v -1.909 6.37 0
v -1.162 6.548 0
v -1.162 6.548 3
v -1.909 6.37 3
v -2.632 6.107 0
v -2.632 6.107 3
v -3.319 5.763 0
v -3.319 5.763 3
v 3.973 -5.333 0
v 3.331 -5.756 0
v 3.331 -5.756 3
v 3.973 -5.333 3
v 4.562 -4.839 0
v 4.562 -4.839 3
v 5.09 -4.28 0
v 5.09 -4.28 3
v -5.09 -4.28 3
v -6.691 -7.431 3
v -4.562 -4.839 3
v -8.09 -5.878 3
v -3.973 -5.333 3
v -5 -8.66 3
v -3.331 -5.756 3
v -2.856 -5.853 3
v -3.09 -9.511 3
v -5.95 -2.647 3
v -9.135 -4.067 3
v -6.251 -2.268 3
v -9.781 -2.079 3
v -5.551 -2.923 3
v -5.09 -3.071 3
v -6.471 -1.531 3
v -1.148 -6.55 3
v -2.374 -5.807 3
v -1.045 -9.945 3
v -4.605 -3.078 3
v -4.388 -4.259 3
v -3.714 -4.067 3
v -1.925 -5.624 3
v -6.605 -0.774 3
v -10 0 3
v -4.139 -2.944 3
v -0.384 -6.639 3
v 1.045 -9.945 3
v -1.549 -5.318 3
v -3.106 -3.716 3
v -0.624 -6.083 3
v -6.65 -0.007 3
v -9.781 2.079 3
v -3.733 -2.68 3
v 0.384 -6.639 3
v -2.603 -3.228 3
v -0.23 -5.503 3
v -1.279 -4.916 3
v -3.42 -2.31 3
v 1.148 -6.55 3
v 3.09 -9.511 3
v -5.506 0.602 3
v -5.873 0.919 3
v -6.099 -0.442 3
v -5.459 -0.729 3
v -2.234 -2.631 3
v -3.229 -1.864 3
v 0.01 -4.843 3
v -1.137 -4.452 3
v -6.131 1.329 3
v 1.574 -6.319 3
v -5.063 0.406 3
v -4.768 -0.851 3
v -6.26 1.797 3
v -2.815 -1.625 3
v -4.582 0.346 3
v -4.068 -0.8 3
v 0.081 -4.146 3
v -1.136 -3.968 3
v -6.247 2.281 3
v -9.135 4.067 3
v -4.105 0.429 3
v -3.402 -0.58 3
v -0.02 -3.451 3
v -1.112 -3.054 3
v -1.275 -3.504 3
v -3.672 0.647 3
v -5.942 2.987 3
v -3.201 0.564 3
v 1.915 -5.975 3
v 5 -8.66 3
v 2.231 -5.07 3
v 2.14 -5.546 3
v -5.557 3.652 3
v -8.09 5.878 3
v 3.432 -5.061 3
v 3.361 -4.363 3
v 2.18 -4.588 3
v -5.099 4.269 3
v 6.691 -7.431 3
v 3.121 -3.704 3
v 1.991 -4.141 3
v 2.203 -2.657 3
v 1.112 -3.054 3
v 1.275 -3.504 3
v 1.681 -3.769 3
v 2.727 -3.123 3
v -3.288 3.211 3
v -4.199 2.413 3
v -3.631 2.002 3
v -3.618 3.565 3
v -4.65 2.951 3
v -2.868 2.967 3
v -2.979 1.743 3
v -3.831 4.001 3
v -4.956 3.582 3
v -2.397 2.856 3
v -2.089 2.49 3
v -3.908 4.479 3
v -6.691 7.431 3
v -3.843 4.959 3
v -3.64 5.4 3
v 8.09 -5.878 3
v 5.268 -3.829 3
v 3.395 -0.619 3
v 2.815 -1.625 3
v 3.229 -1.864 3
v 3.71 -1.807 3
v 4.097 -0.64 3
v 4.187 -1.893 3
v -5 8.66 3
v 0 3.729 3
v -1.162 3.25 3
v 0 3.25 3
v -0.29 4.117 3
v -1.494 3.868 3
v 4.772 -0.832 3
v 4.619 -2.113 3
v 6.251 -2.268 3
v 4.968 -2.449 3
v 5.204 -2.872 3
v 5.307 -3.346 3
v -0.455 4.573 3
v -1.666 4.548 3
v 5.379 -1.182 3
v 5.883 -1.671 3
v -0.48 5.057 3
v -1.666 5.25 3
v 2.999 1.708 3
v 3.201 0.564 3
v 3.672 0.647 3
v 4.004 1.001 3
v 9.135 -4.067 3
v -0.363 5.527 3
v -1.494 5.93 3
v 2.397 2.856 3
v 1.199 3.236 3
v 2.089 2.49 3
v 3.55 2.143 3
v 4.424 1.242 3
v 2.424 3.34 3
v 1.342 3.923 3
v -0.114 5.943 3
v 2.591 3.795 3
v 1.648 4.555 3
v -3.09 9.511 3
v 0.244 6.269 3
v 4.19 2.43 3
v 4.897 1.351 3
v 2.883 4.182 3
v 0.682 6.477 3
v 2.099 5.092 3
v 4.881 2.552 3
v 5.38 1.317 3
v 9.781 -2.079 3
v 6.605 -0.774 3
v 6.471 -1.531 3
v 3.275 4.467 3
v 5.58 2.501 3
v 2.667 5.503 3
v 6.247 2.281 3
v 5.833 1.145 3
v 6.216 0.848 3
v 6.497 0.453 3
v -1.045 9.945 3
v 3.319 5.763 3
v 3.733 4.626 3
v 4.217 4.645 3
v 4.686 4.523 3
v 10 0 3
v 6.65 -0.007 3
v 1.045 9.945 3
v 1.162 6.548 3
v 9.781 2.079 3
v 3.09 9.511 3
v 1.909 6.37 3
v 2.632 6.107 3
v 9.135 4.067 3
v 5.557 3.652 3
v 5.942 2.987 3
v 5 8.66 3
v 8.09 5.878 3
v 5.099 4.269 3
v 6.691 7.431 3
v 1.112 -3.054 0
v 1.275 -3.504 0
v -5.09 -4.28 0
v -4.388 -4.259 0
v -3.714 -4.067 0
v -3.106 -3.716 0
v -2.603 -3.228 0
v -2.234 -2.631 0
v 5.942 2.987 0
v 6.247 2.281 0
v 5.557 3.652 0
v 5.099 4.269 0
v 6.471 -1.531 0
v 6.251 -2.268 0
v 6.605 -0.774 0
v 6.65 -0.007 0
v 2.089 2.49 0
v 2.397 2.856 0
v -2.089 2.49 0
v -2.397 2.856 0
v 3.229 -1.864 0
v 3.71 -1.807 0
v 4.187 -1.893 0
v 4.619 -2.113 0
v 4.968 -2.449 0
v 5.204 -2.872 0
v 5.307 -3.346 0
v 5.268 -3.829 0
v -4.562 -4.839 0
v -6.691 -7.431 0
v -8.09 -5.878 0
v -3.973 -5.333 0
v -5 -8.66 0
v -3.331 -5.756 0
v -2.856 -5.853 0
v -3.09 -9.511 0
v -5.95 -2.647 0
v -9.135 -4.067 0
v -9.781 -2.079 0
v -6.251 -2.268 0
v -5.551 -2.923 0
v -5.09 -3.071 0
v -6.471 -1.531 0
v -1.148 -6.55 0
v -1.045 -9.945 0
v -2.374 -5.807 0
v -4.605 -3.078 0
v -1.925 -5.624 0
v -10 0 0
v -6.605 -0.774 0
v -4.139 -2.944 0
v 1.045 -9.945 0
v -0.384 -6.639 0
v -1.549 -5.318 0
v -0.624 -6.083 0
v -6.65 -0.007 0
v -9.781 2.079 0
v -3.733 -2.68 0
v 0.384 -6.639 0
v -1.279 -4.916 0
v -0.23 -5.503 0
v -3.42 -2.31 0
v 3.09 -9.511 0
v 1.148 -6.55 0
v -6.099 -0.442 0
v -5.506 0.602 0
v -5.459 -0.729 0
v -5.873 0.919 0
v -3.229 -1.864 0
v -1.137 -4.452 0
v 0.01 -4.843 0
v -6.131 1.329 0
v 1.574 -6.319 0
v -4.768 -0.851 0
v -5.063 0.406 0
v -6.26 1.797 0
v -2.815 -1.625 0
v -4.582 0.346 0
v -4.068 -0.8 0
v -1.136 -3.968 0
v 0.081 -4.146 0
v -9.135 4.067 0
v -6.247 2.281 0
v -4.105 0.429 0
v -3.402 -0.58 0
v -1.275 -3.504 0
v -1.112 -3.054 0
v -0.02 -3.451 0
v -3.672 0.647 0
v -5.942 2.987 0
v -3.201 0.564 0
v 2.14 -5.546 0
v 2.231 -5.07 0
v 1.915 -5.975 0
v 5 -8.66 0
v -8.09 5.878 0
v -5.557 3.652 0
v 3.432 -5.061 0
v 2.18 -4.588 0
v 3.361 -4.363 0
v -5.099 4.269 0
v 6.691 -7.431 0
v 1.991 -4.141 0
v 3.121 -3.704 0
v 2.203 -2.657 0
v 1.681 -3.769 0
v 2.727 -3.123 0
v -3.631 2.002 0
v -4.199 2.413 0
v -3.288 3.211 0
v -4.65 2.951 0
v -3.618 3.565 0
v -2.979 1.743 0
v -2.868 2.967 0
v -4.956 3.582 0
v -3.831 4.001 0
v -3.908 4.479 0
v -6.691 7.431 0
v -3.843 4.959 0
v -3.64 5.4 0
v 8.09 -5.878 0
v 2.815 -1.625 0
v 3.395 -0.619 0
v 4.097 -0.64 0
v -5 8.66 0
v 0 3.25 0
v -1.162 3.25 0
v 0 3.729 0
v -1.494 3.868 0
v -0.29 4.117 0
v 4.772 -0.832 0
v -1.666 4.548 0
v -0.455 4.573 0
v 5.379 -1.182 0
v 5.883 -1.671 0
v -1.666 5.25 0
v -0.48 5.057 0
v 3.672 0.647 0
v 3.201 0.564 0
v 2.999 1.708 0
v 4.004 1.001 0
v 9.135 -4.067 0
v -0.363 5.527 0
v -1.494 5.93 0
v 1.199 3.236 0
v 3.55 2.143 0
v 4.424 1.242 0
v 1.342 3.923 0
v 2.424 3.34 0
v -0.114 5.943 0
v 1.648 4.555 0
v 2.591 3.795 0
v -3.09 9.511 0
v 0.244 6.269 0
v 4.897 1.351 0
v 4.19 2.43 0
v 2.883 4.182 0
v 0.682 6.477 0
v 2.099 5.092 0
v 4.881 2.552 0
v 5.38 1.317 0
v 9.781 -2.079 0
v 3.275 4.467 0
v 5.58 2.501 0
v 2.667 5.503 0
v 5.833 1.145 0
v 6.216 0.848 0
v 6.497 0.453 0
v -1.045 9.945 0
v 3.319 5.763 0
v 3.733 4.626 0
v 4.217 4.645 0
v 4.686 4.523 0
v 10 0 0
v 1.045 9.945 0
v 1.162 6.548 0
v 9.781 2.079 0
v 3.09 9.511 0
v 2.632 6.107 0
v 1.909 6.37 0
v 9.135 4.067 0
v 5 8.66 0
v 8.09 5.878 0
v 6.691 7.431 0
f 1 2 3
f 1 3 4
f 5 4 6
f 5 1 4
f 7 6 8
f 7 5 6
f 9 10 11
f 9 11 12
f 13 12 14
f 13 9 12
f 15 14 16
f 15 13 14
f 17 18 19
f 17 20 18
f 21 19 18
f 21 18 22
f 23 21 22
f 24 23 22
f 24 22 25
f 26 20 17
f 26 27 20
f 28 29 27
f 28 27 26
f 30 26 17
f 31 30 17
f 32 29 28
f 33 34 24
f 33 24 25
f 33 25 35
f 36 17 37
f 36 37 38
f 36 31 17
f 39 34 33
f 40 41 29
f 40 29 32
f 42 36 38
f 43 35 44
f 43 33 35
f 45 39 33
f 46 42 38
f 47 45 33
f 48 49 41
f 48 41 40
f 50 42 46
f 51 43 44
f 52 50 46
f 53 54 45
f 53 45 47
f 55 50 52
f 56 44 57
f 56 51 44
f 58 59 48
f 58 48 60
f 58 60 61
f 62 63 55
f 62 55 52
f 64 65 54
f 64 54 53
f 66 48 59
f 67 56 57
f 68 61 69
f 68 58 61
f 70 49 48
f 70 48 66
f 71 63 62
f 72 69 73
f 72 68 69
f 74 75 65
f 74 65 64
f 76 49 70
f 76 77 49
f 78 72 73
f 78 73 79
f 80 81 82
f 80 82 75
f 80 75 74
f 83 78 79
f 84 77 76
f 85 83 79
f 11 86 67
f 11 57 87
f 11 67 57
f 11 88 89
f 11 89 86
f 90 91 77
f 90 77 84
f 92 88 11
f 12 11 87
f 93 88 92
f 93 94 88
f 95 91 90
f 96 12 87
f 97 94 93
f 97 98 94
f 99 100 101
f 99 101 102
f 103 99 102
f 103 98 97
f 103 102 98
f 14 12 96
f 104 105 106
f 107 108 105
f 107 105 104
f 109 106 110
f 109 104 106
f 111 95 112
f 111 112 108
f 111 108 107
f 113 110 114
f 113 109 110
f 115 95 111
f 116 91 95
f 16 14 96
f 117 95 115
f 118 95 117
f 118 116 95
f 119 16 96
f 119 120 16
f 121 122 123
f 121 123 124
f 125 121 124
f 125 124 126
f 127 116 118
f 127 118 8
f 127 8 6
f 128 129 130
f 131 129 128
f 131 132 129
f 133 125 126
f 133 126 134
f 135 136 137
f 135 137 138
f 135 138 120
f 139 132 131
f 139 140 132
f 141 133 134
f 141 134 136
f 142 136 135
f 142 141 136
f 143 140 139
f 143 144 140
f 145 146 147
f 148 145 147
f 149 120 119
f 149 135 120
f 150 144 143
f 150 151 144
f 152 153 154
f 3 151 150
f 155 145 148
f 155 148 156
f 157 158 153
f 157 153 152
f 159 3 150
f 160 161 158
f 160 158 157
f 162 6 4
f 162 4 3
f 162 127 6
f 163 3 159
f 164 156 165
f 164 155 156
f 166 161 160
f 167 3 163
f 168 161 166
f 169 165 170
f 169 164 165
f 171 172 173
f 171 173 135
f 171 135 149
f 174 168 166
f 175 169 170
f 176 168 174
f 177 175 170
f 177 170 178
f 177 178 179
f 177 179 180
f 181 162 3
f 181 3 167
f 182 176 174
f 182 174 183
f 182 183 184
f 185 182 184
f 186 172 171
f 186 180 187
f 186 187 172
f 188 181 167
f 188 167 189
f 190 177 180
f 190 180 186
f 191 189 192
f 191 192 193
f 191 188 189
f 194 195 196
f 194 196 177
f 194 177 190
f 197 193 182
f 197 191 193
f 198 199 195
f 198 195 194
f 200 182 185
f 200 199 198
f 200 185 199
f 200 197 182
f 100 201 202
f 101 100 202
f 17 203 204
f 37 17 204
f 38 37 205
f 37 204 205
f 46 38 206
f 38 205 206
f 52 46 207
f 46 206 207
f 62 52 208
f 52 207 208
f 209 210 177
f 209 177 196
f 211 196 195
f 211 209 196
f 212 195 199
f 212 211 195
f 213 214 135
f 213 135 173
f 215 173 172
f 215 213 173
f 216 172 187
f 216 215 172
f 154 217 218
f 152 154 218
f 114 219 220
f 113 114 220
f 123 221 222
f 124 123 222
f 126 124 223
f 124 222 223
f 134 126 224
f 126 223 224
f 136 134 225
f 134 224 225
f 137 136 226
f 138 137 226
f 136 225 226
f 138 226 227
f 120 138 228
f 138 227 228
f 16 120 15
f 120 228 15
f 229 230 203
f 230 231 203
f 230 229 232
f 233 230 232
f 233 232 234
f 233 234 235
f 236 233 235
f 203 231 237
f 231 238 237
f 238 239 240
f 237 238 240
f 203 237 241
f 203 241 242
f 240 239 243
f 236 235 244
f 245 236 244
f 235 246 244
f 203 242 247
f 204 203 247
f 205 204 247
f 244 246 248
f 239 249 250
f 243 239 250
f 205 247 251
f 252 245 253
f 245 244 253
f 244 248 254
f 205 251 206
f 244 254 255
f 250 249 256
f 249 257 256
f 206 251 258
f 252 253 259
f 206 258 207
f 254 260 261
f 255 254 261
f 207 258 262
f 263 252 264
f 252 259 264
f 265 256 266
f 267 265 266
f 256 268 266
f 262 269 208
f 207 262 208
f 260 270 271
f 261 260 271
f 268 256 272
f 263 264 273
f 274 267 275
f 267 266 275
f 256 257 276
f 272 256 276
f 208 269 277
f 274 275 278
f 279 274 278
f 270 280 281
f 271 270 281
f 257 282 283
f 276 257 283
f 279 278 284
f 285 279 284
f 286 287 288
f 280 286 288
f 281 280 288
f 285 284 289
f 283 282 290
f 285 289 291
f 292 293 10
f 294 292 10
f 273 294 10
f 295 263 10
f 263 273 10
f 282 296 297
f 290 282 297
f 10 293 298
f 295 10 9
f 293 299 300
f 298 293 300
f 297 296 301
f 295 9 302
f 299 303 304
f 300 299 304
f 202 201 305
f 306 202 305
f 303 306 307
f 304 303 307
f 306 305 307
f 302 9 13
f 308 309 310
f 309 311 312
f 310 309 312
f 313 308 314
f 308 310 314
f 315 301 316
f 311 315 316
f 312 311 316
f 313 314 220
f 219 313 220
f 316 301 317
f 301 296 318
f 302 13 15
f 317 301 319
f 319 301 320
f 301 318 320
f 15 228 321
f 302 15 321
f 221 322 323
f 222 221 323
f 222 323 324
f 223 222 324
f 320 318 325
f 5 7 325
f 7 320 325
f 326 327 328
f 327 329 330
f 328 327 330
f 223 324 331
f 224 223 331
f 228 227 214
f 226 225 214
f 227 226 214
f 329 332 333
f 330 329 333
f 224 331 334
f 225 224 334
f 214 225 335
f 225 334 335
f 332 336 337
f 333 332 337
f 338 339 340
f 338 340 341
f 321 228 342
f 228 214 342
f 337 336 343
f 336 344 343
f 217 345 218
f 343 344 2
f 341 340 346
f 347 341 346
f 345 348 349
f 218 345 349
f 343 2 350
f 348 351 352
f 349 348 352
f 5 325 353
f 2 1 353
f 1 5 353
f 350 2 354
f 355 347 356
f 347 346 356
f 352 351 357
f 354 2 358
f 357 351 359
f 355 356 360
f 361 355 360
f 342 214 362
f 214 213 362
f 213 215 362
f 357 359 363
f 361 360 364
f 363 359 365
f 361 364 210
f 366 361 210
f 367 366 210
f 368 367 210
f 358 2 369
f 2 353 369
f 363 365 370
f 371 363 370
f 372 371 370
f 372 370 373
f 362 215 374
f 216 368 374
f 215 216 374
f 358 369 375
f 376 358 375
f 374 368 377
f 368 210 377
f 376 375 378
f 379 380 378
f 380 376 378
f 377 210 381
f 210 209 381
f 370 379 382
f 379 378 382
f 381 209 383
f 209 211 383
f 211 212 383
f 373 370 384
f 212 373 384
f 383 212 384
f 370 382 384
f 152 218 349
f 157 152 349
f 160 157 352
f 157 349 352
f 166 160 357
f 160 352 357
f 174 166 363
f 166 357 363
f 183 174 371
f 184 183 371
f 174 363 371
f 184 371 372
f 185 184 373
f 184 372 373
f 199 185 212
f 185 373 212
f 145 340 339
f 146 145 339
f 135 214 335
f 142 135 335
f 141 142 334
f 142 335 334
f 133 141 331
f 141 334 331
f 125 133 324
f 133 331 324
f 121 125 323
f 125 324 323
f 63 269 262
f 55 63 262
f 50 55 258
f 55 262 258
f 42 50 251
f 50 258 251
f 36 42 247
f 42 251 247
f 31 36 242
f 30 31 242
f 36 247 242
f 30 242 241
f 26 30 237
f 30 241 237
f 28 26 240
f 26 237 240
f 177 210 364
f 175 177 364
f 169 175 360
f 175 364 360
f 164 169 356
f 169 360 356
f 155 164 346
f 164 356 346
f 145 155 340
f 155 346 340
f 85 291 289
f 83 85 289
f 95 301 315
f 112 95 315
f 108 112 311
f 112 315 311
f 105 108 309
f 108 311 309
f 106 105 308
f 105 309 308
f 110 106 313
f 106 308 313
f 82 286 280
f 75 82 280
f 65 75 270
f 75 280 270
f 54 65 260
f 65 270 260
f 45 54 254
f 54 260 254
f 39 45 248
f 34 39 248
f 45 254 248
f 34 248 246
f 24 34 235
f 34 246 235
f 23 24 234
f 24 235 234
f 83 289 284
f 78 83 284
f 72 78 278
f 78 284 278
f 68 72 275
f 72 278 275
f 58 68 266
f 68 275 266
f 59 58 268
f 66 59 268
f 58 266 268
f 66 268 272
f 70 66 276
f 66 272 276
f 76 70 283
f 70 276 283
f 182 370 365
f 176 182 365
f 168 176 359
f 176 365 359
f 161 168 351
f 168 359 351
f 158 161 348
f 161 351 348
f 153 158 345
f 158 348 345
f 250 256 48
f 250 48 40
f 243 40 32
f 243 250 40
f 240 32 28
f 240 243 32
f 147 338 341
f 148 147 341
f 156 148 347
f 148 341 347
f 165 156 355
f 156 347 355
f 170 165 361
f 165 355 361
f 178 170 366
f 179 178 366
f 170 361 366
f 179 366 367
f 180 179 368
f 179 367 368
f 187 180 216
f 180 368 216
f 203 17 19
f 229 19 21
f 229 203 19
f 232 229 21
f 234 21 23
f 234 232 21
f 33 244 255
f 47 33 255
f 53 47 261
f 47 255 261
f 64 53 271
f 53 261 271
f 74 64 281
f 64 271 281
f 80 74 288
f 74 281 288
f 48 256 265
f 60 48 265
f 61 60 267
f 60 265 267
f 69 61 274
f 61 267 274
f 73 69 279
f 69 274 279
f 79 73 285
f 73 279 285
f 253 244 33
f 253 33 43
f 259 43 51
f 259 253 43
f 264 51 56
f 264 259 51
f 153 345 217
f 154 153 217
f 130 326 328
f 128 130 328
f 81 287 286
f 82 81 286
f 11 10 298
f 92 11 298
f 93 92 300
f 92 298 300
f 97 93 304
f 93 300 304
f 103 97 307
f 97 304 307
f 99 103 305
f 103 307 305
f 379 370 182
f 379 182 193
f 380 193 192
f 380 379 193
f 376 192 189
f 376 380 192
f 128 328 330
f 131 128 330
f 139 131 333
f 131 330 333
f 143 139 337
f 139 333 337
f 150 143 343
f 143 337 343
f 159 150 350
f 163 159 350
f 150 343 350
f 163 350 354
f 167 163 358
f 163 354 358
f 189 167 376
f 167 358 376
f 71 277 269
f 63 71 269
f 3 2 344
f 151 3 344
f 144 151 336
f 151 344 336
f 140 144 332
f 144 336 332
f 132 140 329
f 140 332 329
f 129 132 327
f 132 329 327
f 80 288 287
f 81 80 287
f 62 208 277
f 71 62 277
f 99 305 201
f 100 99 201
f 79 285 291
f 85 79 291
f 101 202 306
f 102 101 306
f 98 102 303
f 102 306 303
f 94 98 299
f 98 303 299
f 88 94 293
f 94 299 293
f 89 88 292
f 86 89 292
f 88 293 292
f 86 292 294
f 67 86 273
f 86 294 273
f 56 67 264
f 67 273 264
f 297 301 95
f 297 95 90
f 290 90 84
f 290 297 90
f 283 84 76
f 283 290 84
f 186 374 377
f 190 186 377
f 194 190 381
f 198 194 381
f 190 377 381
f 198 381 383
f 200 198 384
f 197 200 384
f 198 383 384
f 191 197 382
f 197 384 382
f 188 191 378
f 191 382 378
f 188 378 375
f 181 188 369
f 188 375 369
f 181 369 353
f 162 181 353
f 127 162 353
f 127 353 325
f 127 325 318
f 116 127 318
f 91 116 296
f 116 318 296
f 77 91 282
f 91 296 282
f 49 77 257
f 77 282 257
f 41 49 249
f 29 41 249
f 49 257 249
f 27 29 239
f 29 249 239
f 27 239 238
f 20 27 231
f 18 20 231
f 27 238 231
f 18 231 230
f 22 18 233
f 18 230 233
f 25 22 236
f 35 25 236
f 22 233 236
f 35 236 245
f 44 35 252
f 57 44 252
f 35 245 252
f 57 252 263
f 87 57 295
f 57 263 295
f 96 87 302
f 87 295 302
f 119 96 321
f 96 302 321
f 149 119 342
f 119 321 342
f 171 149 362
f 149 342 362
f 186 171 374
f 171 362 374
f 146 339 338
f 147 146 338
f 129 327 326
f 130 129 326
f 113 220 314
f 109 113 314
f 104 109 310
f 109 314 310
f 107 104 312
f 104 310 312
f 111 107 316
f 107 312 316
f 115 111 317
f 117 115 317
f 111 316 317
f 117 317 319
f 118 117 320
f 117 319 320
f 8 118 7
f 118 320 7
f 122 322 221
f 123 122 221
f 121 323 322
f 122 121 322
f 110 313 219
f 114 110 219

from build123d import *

# Parameters (mm, degrees)
F0_R            = 10
F0_R_2          = 6.65
F1_DEPTH        = 3
F3_DEPTH        = 3
F3_COPIES_COUNT = 9


# Not quite as in the source:
# - a pattern or mirror of a feature is missing from the dataset's text; its kind, count and spacing are read off the source's solid
# - a feature names something its author has since deleted; it is built from what else it names


with BuildPart() as f1:
    # F0 (on Top) → F1 (new body)
    with BuildSketch(Plane.XY):
        Circle(F0_R)
        Circle(F0_R_2, mode=Mode.SUBTRACT)
    extrude(amount=F1_DEPTH)

    # F2 (on Top) → F3 (join, through all)
    with BuildSketch(Plane.XY):
        with BuildLine():
            ThreePointArc((0, 3.7286332735), (-0.3629275105, 5.527055954), (1.161605891, 6.5477608199))
            ThreePointArc((1.161605891, 6.5477608199), (0, 6.65), (-1.161605891, 6.5477608199))
            ThreePointArc((-1.161605891, 6.5477608199), (-1.6872745189, 4.8988804099), (-1.161605891, 3.25))
            Line((-1.161605891, 3.25), (0, 3.25))
            Line((0, 3.25), (0, 3.7286332735))
        make_face()
    f3 = extrude(amount=F3_DEPTH)

    # F3_copies: F3 ×9 about axis
    f3_copies_axis = Axis((0, 0, 0), (0, 0, 1))
    for i in range(1, F3_COPIES_COUNT):
        add(f3.rotate(f3_copies_axis, i * 360 / F3_COPIES_COUNT))


solid = f1.part
